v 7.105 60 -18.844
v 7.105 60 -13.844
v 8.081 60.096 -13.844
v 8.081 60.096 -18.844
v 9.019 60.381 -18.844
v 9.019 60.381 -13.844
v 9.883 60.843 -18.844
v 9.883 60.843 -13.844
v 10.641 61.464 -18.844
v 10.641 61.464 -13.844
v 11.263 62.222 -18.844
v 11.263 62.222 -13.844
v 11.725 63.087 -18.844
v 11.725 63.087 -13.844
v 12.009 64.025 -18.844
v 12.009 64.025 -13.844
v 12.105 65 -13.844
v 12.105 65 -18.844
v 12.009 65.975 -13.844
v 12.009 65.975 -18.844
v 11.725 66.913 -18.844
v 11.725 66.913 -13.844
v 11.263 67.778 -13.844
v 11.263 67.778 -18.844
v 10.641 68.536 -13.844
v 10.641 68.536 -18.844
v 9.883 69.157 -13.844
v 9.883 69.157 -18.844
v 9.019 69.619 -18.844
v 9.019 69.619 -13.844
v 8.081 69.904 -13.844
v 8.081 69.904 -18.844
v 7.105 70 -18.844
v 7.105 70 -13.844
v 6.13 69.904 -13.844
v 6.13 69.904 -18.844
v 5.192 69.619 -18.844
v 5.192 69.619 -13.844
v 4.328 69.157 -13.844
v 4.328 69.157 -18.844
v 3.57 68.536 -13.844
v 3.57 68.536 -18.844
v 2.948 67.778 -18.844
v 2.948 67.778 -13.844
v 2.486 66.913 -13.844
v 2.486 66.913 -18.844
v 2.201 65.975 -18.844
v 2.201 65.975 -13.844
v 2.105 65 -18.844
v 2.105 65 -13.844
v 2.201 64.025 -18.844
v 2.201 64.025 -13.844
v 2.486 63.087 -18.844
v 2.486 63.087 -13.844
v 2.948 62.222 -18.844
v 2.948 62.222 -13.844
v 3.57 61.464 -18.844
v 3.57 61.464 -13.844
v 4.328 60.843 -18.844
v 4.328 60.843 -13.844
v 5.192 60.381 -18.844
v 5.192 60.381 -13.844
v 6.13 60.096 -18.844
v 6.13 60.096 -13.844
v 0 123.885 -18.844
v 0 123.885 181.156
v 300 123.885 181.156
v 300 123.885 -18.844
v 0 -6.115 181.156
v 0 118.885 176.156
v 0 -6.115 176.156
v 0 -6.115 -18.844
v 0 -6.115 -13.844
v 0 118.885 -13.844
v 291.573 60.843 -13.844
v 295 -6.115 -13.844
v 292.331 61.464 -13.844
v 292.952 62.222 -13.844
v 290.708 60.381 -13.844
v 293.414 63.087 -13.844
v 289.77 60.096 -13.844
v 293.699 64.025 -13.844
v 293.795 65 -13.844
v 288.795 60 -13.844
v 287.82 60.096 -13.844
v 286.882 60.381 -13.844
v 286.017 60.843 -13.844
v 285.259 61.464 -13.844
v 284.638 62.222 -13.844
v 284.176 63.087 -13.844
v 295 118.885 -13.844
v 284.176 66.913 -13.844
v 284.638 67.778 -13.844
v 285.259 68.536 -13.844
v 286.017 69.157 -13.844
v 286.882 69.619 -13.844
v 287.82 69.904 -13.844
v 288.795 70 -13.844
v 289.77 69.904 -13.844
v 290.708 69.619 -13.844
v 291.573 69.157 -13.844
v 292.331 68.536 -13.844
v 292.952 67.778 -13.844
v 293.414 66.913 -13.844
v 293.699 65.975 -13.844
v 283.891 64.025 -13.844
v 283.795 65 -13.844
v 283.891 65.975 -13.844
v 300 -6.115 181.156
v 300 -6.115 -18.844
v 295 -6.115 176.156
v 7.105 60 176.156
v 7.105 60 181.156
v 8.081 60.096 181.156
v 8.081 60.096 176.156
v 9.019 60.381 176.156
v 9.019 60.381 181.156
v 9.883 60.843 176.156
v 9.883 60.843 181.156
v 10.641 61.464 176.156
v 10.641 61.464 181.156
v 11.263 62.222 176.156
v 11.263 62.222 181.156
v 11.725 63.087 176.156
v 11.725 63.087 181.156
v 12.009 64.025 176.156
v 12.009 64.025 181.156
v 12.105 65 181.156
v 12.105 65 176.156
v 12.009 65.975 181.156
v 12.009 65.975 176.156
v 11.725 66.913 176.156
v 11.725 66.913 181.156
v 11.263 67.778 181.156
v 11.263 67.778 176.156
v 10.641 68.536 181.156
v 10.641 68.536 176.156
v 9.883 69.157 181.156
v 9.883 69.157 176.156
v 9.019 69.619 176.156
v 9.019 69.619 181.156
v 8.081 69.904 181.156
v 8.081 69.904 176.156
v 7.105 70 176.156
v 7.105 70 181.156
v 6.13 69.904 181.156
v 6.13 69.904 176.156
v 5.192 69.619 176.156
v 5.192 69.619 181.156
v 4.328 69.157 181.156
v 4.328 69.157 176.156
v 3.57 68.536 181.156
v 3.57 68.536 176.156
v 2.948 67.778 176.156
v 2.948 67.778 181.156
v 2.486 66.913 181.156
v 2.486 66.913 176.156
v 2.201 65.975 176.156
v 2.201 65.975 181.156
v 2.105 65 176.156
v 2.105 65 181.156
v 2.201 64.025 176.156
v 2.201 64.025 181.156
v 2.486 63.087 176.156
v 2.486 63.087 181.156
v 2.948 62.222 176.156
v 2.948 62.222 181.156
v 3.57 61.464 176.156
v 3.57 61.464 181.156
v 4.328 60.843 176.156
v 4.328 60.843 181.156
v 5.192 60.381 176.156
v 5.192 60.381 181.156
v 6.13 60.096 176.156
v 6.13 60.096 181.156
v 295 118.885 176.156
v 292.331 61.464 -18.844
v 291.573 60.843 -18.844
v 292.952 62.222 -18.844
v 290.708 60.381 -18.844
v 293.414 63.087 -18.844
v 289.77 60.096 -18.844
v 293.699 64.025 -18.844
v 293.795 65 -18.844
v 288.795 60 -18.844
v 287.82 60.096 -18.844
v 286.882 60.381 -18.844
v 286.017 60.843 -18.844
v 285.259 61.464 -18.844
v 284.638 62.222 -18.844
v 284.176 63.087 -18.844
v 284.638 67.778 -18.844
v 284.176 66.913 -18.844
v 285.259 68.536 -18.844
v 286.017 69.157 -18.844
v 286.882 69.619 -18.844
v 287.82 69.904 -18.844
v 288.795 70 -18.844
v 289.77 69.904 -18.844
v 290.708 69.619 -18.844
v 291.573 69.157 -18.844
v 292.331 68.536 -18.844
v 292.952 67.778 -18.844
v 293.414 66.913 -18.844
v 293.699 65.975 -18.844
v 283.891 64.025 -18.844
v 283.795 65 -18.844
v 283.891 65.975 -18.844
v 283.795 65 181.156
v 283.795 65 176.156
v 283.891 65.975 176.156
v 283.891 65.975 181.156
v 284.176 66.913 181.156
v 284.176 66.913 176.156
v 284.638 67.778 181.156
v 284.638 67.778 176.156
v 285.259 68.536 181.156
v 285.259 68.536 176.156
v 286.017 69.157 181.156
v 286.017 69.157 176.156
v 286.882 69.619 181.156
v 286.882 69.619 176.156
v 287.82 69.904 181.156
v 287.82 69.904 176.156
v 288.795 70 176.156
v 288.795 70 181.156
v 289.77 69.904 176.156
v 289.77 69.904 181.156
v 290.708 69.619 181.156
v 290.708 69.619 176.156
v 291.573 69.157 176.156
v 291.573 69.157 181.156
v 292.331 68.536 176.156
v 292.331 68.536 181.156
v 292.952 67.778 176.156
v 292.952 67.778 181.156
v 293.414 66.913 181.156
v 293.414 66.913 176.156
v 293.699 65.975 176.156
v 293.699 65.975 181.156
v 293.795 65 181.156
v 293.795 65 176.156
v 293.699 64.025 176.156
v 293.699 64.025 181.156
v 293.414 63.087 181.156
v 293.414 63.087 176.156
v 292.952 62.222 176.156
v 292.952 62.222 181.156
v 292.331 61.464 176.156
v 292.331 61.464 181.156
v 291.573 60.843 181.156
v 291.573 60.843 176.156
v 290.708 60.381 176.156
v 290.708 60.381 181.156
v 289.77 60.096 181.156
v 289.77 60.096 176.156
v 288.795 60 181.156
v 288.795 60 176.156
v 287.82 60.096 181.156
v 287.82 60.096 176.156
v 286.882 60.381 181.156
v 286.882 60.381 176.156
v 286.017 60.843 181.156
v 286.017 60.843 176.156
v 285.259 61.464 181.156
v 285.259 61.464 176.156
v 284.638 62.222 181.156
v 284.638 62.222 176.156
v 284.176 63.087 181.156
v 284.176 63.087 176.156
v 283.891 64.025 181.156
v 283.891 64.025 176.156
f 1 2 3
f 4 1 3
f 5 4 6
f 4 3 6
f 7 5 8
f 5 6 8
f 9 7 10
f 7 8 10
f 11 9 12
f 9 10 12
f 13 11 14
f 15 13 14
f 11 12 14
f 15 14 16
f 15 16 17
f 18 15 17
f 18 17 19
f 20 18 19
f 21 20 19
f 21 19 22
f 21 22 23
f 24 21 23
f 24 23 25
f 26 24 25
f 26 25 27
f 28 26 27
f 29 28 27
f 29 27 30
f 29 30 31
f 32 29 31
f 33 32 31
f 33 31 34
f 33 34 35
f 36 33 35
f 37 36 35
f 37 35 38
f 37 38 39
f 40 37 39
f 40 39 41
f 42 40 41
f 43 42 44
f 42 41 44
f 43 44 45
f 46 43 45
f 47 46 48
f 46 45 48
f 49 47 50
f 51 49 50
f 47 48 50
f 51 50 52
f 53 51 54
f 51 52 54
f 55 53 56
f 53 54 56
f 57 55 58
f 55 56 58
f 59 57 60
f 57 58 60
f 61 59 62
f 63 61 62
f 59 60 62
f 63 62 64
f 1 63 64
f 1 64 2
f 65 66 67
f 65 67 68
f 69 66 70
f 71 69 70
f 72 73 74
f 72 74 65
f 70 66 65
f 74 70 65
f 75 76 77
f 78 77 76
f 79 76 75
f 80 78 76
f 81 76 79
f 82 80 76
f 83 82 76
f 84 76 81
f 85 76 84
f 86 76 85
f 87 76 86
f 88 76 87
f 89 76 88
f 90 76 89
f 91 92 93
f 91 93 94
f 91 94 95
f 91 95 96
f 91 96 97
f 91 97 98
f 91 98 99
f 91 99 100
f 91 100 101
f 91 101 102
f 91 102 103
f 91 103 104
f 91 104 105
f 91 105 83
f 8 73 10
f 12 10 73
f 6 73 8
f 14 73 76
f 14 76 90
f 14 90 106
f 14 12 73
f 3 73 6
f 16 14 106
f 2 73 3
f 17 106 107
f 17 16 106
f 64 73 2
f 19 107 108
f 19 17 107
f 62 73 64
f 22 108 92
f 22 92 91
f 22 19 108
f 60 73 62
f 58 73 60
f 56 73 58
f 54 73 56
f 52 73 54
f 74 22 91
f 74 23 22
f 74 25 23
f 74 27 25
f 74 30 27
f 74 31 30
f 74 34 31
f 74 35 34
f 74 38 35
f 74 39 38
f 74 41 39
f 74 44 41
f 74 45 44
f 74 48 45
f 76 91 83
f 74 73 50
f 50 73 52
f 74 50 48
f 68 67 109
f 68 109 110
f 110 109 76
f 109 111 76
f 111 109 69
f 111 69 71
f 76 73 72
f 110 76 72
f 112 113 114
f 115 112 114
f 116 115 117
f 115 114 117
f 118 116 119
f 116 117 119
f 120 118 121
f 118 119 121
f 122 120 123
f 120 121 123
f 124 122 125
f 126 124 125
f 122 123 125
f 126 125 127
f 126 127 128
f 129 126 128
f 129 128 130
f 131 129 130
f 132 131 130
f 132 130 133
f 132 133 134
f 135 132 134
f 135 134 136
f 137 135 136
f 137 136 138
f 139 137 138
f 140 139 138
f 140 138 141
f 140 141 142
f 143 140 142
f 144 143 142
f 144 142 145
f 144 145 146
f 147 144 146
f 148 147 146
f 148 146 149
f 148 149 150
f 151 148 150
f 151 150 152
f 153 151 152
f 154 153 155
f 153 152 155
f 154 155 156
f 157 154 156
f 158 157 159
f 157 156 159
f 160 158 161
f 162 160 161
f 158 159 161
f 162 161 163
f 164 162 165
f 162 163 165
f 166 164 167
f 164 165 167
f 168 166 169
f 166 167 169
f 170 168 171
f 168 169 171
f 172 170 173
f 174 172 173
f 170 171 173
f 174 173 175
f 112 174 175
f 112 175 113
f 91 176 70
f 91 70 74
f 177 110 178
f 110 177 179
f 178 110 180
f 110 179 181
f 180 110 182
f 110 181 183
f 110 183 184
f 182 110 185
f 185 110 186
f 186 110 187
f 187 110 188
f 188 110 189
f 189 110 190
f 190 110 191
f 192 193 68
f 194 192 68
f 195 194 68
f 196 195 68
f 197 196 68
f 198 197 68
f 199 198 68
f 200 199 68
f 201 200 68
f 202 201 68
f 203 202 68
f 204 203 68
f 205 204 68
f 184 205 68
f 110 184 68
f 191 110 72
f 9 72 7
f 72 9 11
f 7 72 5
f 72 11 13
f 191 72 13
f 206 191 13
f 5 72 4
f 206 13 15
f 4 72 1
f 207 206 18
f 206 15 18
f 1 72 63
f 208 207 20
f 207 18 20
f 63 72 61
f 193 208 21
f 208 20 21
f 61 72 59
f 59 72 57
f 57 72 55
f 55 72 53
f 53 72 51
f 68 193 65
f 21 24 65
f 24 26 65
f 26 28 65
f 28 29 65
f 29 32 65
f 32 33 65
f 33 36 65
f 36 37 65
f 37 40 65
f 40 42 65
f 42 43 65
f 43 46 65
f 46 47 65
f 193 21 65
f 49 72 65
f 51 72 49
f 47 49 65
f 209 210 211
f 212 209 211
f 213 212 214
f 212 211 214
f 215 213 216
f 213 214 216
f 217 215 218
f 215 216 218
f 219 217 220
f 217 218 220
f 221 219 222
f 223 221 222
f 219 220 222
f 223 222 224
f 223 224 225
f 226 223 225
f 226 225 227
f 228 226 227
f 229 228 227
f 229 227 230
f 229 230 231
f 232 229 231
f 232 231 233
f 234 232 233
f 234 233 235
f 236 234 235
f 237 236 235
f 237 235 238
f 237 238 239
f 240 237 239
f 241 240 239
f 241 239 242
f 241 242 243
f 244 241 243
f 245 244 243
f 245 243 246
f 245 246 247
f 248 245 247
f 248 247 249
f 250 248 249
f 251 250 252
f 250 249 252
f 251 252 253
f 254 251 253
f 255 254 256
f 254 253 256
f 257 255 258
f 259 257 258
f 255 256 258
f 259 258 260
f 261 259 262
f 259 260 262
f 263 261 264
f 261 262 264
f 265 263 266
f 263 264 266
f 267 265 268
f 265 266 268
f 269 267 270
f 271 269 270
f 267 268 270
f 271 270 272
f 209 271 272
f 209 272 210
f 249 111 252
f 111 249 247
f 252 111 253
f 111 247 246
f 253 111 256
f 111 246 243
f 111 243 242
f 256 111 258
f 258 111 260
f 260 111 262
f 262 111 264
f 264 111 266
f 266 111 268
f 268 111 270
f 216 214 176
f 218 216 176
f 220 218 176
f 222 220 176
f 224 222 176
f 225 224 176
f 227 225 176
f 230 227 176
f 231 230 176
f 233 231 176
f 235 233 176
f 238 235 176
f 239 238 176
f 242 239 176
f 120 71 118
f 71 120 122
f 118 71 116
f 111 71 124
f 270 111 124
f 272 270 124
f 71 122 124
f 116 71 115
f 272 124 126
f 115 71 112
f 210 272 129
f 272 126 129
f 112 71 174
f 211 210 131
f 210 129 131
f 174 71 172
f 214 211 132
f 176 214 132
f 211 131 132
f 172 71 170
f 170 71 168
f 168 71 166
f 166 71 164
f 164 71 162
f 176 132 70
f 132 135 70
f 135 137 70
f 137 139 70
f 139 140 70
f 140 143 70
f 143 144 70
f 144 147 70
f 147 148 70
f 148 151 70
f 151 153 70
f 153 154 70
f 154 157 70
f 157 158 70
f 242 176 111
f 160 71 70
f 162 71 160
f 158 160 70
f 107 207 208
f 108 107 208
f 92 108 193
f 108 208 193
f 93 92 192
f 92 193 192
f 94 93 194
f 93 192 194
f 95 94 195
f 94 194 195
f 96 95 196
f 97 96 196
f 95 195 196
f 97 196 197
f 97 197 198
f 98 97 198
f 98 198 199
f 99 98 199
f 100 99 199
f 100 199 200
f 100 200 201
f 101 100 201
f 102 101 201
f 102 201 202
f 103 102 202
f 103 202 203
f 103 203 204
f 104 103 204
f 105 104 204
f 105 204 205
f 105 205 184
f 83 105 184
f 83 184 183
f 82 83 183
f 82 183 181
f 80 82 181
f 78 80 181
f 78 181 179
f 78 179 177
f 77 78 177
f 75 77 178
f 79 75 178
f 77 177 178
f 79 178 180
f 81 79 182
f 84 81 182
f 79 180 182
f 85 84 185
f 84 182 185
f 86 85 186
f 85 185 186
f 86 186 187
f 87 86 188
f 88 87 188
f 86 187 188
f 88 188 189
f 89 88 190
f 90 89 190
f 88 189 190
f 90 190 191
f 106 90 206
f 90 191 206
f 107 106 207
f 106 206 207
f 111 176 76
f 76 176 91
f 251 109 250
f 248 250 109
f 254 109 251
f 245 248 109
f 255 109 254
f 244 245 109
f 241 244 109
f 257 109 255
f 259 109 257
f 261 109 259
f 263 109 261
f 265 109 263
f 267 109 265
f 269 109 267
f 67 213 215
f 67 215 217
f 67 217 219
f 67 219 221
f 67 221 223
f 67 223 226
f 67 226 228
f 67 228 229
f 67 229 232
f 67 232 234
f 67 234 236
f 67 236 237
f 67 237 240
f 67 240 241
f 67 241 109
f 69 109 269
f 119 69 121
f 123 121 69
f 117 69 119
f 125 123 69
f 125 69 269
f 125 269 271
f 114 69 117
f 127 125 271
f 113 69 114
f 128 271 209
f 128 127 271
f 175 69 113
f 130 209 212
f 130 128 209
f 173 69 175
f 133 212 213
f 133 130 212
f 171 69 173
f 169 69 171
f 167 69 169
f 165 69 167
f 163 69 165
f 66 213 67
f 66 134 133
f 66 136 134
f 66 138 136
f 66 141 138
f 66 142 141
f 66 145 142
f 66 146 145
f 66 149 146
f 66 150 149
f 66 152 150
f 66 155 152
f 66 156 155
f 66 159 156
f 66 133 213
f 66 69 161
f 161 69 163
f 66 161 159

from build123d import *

# Parameters (mm, degrees)
SKETCH3_W           = 200
SKETCH3_H           = 130
BOSS_EXTRUDE1_DEPTH = 300
SHELL2_T            = -5
SKETCH12_R          = 5
CUT_EXTRUDE1_DEPTH  = 300
SKETCH13_R          = 5
CUT_EXTRUDE3_DEPTH  = 300


with BuildPart() as part:
    # Sketch3 → Boss-Extrude1 (new body)
    with BuildSketch(Plane(origin=(0, 0, 0), x_dir=(0, 0, -1), z_dir=(1, 0, 0))):
        with Locations((-81.156140409, 58.885017422)):
            Rectangle(SKETCH3_W, SKETCH3_H)
    extrude(amount=BOSS_EXTRUDE1_DEPTH)

    # Shell2
    shell2_openings = [part.faces().sort_by_distance(p)[0] for p in [
        (0, 58.885017422, 81.156140409),
        (150, -6.114982578, 81.156140409),
    ]]
    offset(amount=SHELL2_T, openings=shell2_openings, kind=Kind.INTERSECTION)

    # Sketch12 → Cut-Extrude1 (cut)
    with BuildSketch(Plane(origin=(0, 0, -18.843859591), x_dir=(-1, 0, 0), z_dir=(0, 0, -1))):
        with Locations((-288.794979597, 65)):
            Circle(SKETCH12_R)
    extrude(amount=-CUT_EXTRUDE1_DEPTH, mode=Mode.SUBTRACT)

    # Sketch13 → Cut-Extrude3 (cut)
    with BuildSketch(Plane.XY.offset(181.156140409)):
        with Locations(Location((7.10538066, 65, 0), (0, 0, 270))):
            Circle(SKETCH13_R)
    extrude(amount=-CUT_EXTRUDE3_DEPTH, mode=Mode.SUBTRACT)


solid = part.part
